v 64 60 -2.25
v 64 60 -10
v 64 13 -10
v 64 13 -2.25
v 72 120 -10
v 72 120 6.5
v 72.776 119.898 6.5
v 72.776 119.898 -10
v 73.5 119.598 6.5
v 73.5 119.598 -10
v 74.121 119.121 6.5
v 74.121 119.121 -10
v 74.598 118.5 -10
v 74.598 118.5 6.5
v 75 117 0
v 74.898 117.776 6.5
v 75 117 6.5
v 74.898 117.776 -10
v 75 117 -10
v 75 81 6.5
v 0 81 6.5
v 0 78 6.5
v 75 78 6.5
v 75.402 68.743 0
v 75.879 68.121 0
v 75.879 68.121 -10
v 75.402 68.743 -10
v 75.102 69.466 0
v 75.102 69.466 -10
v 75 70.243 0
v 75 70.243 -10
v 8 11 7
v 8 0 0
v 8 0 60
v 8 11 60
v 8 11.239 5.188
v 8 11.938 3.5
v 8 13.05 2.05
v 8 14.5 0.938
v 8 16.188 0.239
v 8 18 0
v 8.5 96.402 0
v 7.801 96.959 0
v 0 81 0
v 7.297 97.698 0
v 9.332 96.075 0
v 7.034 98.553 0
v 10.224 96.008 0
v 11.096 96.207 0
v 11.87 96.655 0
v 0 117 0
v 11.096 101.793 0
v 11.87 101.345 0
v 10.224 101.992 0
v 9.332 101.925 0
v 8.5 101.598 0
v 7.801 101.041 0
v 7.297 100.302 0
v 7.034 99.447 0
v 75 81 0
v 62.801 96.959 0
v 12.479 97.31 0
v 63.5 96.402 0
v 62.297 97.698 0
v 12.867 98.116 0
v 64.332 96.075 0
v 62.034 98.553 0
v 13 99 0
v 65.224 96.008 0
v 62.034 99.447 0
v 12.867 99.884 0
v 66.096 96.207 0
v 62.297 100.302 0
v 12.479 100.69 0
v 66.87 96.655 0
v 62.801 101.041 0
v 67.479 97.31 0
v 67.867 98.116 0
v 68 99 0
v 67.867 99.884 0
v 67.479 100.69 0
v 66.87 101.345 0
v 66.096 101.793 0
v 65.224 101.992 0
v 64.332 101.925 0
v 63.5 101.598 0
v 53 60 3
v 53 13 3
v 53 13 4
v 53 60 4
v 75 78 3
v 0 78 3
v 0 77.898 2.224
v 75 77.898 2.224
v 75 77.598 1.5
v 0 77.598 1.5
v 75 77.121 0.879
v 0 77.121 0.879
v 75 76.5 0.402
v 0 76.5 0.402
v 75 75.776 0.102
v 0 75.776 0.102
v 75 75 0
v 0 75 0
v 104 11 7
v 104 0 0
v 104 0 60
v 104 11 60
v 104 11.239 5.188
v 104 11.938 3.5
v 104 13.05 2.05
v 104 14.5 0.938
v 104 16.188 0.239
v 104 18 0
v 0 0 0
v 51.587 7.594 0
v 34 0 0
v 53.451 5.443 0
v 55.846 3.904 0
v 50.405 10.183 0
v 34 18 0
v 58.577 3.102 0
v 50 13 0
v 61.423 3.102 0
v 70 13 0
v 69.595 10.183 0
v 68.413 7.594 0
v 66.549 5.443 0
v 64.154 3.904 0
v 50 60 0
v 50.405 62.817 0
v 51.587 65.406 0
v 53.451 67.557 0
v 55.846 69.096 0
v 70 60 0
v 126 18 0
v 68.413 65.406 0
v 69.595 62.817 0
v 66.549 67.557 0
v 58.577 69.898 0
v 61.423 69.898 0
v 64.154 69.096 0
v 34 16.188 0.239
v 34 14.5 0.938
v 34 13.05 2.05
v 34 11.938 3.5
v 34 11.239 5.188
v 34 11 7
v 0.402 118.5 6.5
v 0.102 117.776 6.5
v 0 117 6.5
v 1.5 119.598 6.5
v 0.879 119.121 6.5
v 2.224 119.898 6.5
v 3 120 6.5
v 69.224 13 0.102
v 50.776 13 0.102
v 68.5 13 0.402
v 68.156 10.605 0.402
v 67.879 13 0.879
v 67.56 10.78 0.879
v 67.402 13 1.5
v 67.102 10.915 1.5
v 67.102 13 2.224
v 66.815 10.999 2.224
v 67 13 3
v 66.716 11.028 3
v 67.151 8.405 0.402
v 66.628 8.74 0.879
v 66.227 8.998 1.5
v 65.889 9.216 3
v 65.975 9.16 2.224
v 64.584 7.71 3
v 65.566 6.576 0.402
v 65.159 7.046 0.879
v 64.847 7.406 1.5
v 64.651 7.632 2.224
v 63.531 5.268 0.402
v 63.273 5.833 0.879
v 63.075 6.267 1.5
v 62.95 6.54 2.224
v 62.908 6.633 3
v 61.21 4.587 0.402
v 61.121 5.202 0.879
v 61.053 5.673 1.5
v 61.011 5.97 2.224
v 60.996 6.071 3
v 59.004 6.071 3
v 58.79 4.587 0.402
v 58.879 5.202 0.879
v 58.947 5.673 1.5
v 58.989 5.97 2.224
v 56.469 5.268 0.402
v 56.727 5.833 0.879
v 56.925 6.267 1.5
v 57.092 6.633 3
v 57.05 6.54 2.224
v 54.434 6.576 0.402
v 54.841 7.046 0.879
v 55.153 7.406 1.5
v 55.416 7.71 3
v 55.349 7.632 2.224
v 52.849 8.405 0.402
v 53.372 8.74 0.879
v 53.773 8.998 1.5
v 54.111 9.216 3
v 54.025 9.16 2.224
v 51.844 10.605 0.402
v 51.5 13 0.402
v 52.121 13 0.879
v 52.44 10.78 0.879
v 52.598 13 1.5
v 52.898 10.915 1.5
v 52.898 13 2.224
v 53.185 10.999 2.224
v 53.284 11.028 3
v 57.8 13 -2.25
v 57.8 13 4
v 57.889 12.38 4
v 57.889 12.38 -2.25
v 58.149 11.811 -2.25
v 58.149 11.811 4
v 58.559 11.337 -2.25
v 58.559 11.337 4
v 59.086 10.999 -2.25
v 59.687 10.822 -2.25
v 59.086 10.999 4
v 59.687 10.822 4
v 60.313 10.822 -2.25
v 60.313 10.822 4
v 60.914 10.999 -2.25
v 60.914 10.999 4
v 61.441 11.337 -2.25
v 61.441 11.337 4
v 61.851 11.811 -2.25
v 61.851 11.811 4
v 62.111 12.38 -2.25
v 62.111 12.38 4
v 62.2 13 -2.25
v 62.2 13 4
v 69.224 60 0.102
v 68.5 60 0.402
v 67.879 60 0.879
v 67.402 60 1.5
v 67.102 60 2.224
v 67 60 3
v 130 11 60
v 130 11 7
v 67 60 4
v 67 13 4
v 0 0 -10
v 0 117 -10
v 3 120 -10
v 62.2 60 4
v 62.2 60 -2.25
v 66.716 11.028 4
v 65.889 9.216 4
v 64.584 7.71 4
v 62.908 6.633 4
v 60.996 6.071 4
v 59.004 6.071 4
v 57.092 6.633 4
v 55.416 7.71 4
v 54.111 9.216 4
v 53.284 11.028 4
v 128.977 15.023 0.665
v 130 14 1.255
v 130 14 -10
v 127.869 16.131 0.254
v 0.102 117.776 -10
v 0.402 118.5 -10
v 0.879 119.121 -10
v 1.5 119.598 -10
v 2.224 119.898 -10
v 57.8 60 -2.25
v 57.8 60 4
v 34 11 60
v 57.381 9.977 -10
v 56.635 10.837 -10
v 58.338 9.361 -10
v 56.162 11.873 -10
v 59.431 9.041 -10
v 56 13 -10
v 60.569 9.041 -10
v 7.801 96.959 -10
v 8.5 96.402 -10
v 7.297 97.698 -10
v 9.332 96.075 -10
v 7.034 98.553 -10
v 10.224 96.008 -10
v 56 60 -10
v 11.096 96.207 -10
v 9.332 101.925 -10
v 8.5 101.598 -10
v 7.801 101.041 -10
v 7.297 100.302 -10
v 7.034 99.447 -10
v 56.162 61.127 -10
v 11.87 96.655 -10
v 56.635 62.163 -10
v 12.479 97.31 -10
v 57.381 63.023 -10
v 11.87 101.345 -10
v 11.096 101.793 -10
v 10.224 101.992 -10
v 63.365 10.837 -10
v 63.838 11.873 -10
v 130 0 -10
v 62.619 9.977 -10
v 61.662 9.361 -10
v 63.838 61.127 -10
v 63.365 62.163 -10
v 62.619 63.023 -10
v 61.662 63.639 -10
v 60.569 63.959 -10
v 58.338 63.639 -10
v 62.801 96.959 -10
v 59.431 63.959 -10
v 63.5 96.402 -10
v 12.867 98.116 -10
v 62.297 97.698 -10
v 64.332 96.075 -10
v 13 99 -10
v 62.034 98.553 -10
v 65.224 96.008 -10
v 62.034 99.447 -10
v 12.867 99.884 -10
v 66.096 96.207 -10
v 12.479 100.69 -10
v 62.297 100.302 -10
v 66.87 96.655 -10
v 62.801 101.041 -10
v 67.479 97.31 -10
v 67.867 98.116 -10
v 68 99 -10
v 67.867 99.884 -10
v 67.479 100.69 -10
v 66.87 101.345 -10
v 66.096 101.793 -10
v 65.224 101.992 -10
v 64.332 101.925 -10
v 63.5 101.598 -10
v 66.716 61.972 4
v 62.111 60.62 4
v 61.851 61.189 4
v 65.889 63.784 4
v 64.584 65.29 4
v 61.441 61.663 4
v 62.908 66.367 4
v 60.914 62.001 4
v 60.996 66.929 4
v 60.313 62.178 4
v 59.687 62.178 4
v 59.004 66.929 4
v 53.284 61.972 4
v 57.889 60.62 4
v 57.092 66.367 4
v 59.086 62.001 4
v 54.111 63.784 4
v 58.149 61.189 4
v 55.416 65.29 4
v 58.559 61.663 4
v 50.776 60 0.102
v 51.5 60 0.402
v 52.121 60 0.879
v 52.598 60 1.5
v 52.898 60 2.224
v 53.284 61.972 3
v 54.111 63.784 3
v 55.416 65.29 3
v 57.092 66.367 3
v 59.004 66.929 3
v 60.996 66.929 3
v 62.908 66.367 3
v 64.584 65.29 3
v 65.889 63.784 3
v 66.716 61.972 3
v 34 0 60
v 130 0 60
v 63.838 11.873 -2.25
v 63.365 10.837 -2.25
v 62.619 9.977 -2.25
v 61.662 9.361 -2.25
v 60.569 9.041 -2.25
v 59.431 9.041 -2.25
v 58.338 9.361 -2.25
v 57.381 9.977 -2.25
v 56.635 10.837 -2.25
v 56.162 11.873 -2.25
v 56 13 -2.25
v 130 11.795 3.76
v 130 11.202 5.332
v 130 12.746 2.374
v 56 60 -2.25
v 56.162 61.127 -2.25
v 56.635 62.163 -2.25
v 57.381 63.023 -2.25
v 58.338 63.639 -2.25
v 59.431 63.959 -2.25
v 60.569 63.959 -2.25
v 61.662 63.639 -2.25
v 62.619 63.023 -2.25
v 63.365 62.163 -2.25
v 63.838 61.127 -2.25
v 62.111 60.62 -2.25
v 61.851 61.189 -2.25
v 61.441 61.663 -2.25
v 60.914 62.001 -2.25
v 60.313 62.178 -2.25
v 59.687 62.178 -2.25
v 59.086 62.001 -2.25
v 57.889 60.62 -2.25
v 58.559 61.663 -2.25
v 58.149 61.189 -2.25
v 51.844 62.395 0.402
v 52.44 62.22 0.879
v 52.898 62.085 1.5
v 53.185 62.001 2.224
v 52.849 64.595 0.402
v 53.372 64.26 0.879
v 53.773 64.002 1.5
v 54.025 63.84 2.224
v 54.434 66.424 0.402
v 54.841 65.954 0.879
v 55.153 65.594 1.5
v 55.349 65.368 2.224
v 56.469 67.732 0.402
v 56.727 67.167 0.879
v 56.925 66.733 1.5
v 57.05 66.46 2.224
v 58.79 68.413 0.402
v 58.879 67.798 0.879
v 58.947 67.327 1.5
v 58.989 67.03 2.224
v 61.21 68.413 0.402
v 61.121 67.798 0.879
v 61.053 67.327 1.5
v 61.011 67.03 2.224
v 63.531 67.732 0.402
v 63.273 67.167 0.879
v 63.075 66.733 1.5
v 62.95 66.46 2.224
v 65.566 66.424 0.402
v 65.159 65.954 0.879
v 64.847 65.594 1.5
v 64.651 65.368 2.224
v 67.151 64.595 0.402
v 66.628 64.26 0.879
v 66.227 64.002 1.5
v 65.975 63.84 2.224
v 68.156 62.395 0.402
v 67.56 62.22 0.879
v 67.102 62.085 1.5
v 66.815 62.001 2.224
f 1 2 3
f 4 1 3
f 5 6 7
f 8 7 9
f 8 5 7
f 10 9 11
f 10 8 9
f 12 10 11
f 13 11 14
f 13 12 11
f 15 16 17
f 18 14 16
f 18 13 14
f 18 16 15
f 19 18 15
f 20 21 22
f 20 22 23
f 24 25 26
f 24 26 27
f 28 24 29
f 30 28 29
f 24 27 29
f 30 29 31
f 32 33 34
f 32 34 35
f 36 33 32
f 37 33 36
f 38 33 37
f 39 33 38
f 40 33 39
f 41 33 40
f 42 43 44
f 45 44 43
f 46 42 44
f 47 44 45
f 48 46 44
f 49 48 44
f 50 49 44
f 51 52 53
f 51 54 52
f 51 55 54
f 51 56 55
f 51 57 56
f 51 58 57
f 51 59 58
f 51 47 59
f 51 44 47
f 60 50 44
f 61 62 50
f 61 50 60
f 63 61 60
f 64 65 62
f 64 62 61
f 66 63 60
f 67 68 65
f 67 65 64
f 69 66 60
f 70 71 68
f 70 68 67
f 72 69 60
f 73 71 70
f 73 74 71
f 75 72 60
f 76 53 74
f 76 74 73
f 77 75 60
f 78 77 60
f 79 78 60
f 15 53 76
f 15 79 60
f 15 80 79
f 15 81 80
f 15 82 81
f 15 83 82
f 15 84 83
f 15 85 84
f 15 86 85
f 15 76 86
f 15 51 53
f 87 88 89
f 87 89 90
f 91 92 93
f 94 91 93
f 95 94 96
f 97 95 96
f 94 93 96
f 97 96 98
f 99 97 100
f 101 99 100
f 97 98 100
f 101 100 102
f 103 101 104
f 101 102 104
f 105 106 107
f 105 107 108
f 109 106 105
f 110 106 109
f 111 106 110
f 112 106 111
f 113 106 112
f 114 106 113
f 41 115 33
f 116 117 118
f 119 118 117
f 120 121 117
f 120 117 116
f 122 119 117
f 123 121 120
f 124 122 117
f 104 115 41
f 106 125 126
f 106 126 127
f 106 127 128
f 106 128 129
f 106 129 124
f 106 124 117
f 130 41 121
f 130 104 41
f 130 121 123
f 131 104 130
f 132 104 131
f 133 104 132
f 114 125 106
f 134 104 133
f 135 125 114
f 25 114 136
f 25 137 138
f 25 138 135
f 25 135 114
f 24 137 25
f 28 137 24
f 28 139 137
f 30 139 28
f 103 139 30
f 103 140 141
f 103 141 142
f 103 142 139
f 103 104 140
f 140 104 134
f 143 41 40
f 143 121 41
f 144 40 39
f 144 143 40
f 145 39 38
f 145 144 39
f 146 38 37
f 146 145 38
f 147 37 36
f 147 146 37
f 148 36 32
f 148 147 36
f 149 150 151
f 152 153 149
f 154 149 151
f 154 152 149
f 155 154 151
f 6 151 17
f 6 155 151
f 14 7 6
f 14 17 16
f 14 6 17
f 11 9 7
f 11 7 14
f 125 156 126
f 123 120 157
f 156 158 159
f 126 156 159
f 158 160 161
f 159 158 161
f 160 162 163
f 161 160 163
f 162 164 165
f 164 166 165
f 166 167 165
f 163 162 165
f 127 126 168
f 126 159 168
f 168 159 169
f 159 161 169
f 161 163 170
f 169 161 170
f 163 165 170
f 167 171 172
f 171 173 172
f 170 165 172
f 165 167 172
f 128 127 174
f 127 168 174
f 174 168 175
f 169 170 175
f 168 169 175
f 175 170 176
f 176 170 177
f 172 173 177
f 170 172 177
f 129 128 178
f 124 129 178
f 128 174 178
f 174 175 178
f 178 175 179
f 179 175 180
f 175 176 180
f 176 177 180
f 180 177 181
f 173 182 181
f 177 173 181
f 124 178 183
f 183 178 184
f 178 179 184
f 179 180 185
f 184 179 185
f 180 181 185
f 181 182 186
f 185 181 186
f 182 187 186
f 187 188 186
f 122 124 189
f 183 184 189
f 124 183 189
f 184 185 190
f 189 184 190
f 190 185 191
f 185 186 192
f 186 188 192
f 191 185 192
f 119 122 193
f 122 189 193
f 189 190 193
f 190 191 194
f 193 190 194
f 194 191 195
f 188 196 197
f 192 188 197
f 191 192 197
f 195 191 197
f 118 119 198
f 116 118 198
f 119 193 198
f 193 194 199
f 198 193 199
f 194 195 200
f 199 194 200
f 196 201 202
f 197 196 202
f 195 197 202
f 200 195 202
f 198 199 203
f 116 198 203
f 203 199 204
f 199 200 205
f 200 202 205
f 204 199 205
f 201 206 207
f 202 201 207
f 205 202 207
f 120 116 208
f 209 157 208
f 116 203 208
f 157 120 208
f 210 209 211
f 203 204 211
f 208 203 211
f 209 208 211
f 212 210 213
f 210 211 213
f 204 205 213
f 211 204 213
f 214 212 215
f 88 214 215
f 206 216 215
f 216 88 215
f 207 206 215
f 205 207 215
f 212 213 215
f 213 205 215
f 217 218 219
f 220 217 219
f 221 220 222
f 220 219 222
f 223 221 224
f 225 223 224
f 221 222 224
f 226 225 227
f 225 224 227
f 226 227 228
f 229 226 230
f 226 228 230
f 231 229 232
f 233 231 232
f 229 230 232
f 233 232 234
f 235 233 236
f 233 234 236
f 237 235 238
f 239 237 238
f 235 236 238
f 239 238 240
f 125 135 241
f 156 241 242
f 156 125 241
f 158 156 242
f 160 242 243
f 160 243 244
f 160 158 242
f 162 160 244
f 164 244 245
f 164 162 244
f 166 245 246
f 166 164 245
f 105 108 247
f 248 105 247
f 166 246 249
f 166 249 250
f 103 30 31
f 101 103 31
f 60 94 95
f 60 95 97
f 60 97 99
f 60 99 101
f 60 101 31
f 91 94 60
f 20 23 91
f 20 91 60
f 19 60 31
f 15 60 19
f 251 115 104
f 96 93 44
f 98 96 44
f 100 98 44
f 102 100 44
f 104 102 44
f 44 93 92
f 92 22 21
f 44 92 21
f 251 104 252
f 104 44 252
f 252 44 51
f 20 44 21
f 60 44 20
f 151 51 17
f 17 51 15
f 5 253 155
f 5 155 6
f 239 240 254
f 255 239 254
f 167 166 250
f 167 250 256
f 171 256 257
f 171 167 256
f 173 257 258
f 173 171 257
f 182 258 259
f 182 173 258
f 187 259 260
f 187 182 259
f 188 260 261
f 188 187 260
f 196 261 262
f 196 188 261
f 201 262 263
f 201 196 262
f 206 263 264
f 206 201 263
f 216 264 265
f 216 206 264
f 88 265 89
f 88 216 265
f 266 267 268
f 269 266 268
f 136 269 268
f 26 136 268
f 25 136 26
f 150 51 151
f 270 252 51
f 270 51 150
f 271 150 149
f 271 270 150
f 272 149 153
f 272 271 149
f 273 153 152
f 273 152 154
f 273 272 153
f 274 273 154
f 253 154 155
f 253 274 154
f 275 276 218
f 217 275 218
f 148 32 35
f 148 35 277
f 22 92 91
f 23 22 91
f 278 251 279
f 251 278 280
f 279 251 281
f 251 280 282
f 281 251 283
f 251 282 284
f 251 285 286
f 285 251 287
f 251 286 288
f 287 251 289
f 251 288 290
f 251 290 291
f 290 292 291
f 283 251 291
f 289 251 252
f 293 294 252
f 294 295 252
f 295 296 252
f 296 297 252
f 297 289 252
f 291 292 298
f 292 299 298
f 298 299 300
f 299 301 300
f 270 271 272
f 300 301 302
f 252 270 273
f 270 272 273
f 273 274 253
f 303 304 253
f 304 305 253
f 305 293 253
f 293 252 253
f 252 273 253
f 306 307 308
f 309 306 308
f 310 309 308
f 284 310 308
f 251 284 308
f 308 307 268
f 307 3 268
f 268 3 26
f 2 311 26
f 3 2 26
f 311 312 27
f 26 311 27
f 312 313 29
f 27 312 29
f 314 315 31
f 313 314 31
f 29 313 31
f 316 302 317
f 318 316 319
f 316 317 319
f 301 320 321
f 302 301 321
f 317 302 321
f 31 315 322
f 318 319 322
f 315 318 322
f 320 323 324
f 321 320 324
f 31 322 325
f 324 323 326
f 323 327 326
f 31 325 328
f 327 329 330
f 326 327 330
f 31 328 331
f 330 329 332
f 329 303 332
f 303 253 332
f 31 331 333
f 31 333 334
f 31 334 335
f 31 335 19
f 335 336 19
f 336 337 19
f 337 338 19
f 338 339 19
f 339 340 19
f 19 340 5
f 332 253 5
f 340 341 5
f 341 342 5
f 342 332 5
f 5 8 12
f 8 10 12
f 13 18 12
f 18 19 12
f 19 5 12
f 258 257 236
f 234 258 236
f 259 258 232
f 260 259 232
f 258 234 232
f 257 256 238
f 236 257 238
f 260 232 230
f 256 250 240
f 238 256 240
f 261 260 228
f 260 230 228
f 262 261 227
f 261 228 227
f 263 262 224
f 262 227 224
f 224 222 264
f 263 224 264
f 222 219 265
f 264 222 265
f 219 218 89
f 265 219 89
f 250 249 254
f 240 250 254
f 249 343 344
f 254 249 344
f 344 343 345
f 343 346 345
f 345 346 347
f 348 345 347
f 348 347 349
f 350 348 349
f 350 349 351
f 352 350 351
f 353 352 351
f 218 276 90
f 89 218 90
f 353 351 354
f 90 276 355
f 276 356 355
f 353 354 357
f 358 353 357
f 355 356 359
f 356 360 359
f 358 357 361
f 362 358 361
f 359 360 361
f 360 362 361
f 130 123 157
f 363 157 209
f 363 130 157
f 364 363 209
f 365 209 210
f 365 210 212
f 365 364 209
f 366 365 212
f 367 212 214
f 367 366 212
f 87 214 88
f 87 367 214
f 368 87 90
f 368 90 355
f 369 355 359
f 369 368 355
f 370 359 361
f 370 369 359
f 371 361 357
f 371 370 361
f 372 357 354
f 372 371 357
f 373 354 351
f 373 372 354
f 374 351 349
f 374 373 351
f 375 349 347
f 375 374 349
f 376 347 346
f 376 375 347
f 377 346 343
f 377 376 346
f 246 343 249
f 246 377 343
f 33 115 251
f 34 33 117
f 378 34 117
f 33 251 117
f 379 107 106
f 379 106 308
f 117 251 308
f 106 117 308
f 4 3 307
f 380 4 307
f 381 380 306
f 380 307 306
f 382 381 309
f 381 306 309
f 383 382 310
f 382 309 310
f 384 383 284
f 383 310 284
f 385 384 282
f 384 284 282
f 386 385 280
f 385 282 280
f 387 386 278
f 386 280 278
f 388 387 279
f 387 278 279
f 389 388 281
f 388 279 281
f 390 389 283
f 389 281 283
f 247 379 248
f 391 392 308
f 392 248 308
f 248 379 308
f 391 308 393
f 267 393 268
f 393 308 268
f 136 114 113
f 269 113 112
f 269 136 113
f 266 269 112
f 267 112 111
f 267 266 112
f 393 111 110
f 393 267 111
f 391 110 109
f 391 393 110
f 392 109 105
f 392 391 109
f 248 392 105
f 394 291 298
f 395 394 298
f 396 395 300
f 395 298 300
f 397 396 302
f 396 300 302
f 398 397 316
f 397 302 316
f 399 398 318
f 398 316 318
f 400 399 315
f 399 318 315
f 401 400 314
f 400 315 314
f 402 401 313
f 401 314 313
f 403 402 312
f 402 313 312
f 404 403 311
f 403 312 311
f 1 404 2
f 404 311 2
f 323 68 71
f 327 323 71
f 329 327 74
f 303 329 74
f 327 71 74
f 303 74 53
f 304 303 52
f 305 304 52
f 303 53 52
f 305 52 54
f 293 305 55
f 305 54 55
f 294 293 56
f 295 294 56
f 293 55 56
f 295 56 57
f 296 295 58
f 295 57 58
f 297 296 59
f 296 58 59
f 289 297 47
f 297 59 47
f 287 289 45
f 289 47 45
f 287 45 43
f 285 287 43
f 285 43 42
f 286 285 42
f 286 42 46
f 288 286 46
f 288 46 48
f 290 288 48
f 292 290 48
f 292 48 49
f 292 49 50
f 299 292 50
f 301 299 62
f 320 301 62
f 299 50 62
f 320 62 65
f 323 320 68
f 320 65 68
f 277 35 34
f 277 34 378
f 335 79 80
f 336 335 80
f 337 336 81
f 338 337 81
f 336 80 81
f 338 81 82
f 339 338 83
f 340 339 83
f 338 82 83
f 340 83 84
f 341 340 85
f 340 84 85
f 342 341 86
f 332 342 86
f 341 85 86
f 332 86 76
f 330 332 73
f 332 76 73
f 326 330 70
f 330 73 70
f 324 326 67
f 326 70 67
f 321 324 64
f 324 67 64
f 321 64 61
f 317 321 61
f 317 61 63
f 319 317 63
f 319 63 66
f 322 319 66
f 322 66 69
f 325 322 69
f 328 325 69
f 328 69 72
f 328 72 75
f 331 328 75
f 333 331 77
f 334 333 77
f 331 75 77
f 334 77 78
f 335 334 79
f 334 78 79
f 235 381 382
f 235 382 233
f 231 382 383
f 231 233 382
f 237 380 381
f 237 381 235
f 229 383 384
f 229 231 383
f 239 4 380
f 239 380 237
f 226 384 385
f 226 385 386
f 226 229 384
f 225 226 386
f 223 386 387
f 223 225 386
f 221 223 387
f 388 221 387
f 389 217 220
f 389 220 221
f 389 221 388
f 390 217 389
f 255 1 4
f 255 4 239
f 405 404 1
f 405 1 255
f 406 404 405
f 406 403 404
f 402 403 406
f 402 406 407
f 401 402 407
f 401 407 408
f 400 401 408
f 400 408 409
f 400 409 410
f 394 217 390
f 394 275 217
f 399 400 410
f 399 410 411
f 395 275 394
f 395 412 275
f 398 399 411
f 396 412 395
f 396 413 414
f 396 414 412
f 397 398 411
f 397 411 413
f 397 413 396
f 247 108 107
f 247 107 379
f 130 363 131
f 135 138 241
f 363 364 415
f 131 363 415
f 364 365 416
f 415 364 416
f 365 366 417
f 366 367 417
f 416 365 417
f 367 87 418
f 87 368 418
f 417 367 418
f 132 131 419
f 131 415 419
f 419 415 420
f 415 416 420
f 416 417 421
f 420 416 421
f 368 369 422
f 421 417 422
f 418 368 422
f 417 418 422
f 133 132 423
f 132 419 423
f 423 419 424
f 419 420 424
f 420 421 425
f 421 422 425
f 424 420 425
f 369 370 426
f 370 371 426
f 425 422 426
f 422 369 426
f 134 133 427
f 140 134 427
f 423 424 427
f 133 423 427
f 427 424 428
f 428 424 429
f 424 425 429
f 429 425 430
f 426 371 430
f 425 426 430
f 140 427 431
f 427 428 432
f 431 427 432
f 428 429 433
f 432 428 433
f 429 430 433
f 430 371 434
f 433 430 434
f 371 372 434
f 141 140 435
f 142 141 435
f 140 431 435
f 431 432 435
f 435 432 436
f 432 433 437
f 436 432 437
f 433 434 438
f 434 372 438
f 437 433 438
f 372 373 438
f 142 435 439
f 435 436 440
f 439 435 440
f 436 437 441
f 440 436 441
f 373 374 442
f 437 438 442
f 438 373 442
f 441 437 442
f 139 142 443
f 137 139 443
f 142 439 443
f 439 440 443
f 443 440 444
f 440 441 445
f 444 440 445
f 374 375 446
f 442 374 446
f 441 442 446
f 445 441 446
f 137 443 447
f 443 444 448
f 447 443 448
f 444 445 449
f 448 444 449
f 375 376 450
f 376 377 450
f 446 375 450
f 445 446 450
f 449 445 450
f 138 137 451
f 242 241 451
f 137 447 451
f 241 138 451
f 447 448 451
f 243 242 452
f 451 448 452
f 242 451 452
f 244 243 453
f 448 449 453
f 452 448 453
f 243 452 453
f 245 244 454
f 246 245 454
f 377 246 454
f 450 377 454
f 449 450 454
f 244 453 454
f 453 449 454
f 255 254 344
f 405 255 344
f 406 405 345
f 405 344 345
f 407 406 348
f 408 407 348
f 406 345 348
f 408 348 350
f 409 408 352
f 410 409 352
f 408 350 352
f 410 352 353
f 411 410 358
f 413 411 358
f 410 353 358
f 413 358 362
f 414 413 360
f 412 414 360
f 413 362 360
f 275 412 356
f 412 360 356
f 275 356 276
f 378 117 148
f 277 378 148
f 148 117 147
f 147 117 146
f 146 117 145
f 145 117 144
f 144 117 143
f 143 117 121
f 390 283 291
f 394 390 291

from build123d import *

# Parameters (mm, degrees)
BOSS_EXTRUDE1_DEPTH = 10
SKETCH3_W           = 75
SKETCH3_H           = 3
BOSS_EXTRUDE2_DEPTH = 6.5
SKETCH4_R           = 3
CUT_EXTRUDE2_DEPTH  = 10
SKETCH5_W           = 26
SKETCH5_H           = 11
BOSS_EXTRUDE3_DEPTH = 60
BOSS_EXTRUDE5_DEPTH = 4
CUT_EXTRUDE3_DEPTH  = 186.569394028
FILLET2_START       = -10
FILLET2_DEPTH       = 10
FILLET2_2_DEPTH     = 75
FILLET2_START_2     = -11
FILLET2_3_DEPTH     = 18
CUT_EXTRUDE5_DEPTH  = 7.75
FILLET4_R           = 3
FILLET5_R           = 7


with BuildPart() as part:
    # Sketch2 → Boss-Extrude1 (new body)
    with BuildSketch(Plane.XY):
        Polygon((0, 0), (130, 0), (130, 14), (75, 69), (75, 120), (0, 120), align=None)
    extrude(amount=-BOSS_EXTRUDE1_DEPTH)

    # Sketch3 → Boss-Extrude2 (add)
    with BuildSketch(Plane.XY):
        with Locations((37.5, 118.5)):
            Rectangle(SKETCH3_W, SKETCH3_H)
        with Locations((37.5, 79.5)):
            Rectangle(SKETCH3_W, SKETCH3_H)
    extrude(amount=BOSS_EXTRUDE2_DEPTH)

    # Sketch4 → Cut-Extrude2 (cut)
    with BuildSketch(Plane.XY):
        with Locations((10, 99)):
            Circle(SKETCH4_R)
        with Locations((65, 99)):
            Circle(SKETCH4_R)
    extrude(amount=-CUT_EXTRUDE2_DEPTH, mode=Mode.SUBTRACT)

    # Sketch5 → Boss-Extrude3 (add)
    with BuildSketch(Plane.XY):
        with Locations((117, 5.5)):
            Rectangle(SKETCH5_W, SKETCH5_H)
        with Locations((21, 5.5)):
            Rectangle(SKETCH5_W, SKETCH5_H)
    extrude(amount=BOSS_EXTRUDE3_DEPTH)

    # Sketch7 → Boss-Extrude5 (add)
    with BuildSketch(Plane.XY):
        with BuildLine():
            Line((53, 13), (53, 60))
            ThreePointArc((53, 60), (60, 67), (67, 60))
            Line((67, 60), (67, 13))
            ThreePointArc((67, 13), (60, 6), (53, 13))
        make_face()
    extrude(amount=BOSS_EXTRUDE5_DEPTH)

    # Sketch8 → Cut-Extrude3 (cut, through all)
    with BuildSketch(Plane.XY.offset(4)):
        with BuildLine():
            Line((62.2, 13), (62.2, 60))
            ThreePointArc((62.2, 60), (60, 62.2), (57.8, 60))
            Line((57.8, 60), (57.8, 13))
            ThreePointArc((57.8, 13), (60, 10.8), (62.2, 13))
        make_face()
    extrude(amount=-CUT_EXTRUDE3_DEPTH, mode=Mode.SUBTRACT)

    # Fillet2: read off the stored shape, not the designer's step
    # Fillet2 outline → Fillet2 (add)
    with BuildSketch(Plane.XY.offset(FILLET2_START)):
        with BuildLine():
            ThreePointArc((75.878679656, 68.121320344), (75.228361402, 69.09459039), (75, 70.242640687))
            Line((75, 70.242640687), (75, 69))
            Line((75, 69), (75.878679656, 68.121320344))
        make_face()
    extrude(amount=FILLET2_DEPTH)

    # Fillet2 2 outline → Fillet2 2 (add)
    with BuildSketch(Plane.YZ):
        with BuildLine():
            ThreePointArc((78, 3), (77.121320344, 0.878679656), (75, 0))
            Line((75, 0), (78, 0))
            Line((78, 0), (78, 3))
        make_face()
    extrude(amount=FILLET2_2_DEPTH)

    # Fillet2 3 outline → Fillet2 3 (cut)
    with BuildSketch(Plane.XY.offset(FILLET2_START_2)):
        with BuildLine():
            ThreePointArc((0, 117), (0.878679656, 119.121320344), (3, 120))
            Line((3, 120), (0, 120))
            Line((0, 120), (0, 117))
        make_face()
        with BuildLine():
            ThreePointArc((72, 120), (74.121320344, 119.121320344), (75, 117))
            Line((75, 117), (75, 120))
            Line((75, 120), (72, 120))
        make_face()
    extrude(amount=FILLET2_3_DEPTH, mode=Mode.SUBTRACT)

    # Sketch9 → Cut-Extrude5 (cut)
    with BuildSketch(Plane(origin=(0, 0, -10), x_dir=(-1, 0, 0), z_dir=(0, 0, -1))):
        with BuildLine():
            Line((-64, 60), (-64, 13))
            ThreePointArc((-64, 13), (-60, 9), (-56, 13))
            Line((-56, 13), (-56, 60))
            ThreePointArc((-56, 60), (-60, 64), (-64, 60))
        make_face()
    extrude(amount=-CUT_EXTRUDE5_DEPTH, mode=Mode.SUBTRACT)

    # Fillet4
    fillet4_edges = [part.edges().sort_by_distance(p)[0] for p in [
        (60, 6, 0),
        (67, 36.5, 0),
        (60, 67, 0),
        (53, 36.5, 0),
    ]]
    fillet(fillet4_edges, radius=FILLET4_R)

    # Fillet5
    fillet5_edges = [part.edges().sort_by_distance(p)[0] for p in [
        (117, 11, 0),
        (21, 11, 0),
    ]]
    fillet(fillet5_edges, radius=FILLET5_R)


solid = part.part
